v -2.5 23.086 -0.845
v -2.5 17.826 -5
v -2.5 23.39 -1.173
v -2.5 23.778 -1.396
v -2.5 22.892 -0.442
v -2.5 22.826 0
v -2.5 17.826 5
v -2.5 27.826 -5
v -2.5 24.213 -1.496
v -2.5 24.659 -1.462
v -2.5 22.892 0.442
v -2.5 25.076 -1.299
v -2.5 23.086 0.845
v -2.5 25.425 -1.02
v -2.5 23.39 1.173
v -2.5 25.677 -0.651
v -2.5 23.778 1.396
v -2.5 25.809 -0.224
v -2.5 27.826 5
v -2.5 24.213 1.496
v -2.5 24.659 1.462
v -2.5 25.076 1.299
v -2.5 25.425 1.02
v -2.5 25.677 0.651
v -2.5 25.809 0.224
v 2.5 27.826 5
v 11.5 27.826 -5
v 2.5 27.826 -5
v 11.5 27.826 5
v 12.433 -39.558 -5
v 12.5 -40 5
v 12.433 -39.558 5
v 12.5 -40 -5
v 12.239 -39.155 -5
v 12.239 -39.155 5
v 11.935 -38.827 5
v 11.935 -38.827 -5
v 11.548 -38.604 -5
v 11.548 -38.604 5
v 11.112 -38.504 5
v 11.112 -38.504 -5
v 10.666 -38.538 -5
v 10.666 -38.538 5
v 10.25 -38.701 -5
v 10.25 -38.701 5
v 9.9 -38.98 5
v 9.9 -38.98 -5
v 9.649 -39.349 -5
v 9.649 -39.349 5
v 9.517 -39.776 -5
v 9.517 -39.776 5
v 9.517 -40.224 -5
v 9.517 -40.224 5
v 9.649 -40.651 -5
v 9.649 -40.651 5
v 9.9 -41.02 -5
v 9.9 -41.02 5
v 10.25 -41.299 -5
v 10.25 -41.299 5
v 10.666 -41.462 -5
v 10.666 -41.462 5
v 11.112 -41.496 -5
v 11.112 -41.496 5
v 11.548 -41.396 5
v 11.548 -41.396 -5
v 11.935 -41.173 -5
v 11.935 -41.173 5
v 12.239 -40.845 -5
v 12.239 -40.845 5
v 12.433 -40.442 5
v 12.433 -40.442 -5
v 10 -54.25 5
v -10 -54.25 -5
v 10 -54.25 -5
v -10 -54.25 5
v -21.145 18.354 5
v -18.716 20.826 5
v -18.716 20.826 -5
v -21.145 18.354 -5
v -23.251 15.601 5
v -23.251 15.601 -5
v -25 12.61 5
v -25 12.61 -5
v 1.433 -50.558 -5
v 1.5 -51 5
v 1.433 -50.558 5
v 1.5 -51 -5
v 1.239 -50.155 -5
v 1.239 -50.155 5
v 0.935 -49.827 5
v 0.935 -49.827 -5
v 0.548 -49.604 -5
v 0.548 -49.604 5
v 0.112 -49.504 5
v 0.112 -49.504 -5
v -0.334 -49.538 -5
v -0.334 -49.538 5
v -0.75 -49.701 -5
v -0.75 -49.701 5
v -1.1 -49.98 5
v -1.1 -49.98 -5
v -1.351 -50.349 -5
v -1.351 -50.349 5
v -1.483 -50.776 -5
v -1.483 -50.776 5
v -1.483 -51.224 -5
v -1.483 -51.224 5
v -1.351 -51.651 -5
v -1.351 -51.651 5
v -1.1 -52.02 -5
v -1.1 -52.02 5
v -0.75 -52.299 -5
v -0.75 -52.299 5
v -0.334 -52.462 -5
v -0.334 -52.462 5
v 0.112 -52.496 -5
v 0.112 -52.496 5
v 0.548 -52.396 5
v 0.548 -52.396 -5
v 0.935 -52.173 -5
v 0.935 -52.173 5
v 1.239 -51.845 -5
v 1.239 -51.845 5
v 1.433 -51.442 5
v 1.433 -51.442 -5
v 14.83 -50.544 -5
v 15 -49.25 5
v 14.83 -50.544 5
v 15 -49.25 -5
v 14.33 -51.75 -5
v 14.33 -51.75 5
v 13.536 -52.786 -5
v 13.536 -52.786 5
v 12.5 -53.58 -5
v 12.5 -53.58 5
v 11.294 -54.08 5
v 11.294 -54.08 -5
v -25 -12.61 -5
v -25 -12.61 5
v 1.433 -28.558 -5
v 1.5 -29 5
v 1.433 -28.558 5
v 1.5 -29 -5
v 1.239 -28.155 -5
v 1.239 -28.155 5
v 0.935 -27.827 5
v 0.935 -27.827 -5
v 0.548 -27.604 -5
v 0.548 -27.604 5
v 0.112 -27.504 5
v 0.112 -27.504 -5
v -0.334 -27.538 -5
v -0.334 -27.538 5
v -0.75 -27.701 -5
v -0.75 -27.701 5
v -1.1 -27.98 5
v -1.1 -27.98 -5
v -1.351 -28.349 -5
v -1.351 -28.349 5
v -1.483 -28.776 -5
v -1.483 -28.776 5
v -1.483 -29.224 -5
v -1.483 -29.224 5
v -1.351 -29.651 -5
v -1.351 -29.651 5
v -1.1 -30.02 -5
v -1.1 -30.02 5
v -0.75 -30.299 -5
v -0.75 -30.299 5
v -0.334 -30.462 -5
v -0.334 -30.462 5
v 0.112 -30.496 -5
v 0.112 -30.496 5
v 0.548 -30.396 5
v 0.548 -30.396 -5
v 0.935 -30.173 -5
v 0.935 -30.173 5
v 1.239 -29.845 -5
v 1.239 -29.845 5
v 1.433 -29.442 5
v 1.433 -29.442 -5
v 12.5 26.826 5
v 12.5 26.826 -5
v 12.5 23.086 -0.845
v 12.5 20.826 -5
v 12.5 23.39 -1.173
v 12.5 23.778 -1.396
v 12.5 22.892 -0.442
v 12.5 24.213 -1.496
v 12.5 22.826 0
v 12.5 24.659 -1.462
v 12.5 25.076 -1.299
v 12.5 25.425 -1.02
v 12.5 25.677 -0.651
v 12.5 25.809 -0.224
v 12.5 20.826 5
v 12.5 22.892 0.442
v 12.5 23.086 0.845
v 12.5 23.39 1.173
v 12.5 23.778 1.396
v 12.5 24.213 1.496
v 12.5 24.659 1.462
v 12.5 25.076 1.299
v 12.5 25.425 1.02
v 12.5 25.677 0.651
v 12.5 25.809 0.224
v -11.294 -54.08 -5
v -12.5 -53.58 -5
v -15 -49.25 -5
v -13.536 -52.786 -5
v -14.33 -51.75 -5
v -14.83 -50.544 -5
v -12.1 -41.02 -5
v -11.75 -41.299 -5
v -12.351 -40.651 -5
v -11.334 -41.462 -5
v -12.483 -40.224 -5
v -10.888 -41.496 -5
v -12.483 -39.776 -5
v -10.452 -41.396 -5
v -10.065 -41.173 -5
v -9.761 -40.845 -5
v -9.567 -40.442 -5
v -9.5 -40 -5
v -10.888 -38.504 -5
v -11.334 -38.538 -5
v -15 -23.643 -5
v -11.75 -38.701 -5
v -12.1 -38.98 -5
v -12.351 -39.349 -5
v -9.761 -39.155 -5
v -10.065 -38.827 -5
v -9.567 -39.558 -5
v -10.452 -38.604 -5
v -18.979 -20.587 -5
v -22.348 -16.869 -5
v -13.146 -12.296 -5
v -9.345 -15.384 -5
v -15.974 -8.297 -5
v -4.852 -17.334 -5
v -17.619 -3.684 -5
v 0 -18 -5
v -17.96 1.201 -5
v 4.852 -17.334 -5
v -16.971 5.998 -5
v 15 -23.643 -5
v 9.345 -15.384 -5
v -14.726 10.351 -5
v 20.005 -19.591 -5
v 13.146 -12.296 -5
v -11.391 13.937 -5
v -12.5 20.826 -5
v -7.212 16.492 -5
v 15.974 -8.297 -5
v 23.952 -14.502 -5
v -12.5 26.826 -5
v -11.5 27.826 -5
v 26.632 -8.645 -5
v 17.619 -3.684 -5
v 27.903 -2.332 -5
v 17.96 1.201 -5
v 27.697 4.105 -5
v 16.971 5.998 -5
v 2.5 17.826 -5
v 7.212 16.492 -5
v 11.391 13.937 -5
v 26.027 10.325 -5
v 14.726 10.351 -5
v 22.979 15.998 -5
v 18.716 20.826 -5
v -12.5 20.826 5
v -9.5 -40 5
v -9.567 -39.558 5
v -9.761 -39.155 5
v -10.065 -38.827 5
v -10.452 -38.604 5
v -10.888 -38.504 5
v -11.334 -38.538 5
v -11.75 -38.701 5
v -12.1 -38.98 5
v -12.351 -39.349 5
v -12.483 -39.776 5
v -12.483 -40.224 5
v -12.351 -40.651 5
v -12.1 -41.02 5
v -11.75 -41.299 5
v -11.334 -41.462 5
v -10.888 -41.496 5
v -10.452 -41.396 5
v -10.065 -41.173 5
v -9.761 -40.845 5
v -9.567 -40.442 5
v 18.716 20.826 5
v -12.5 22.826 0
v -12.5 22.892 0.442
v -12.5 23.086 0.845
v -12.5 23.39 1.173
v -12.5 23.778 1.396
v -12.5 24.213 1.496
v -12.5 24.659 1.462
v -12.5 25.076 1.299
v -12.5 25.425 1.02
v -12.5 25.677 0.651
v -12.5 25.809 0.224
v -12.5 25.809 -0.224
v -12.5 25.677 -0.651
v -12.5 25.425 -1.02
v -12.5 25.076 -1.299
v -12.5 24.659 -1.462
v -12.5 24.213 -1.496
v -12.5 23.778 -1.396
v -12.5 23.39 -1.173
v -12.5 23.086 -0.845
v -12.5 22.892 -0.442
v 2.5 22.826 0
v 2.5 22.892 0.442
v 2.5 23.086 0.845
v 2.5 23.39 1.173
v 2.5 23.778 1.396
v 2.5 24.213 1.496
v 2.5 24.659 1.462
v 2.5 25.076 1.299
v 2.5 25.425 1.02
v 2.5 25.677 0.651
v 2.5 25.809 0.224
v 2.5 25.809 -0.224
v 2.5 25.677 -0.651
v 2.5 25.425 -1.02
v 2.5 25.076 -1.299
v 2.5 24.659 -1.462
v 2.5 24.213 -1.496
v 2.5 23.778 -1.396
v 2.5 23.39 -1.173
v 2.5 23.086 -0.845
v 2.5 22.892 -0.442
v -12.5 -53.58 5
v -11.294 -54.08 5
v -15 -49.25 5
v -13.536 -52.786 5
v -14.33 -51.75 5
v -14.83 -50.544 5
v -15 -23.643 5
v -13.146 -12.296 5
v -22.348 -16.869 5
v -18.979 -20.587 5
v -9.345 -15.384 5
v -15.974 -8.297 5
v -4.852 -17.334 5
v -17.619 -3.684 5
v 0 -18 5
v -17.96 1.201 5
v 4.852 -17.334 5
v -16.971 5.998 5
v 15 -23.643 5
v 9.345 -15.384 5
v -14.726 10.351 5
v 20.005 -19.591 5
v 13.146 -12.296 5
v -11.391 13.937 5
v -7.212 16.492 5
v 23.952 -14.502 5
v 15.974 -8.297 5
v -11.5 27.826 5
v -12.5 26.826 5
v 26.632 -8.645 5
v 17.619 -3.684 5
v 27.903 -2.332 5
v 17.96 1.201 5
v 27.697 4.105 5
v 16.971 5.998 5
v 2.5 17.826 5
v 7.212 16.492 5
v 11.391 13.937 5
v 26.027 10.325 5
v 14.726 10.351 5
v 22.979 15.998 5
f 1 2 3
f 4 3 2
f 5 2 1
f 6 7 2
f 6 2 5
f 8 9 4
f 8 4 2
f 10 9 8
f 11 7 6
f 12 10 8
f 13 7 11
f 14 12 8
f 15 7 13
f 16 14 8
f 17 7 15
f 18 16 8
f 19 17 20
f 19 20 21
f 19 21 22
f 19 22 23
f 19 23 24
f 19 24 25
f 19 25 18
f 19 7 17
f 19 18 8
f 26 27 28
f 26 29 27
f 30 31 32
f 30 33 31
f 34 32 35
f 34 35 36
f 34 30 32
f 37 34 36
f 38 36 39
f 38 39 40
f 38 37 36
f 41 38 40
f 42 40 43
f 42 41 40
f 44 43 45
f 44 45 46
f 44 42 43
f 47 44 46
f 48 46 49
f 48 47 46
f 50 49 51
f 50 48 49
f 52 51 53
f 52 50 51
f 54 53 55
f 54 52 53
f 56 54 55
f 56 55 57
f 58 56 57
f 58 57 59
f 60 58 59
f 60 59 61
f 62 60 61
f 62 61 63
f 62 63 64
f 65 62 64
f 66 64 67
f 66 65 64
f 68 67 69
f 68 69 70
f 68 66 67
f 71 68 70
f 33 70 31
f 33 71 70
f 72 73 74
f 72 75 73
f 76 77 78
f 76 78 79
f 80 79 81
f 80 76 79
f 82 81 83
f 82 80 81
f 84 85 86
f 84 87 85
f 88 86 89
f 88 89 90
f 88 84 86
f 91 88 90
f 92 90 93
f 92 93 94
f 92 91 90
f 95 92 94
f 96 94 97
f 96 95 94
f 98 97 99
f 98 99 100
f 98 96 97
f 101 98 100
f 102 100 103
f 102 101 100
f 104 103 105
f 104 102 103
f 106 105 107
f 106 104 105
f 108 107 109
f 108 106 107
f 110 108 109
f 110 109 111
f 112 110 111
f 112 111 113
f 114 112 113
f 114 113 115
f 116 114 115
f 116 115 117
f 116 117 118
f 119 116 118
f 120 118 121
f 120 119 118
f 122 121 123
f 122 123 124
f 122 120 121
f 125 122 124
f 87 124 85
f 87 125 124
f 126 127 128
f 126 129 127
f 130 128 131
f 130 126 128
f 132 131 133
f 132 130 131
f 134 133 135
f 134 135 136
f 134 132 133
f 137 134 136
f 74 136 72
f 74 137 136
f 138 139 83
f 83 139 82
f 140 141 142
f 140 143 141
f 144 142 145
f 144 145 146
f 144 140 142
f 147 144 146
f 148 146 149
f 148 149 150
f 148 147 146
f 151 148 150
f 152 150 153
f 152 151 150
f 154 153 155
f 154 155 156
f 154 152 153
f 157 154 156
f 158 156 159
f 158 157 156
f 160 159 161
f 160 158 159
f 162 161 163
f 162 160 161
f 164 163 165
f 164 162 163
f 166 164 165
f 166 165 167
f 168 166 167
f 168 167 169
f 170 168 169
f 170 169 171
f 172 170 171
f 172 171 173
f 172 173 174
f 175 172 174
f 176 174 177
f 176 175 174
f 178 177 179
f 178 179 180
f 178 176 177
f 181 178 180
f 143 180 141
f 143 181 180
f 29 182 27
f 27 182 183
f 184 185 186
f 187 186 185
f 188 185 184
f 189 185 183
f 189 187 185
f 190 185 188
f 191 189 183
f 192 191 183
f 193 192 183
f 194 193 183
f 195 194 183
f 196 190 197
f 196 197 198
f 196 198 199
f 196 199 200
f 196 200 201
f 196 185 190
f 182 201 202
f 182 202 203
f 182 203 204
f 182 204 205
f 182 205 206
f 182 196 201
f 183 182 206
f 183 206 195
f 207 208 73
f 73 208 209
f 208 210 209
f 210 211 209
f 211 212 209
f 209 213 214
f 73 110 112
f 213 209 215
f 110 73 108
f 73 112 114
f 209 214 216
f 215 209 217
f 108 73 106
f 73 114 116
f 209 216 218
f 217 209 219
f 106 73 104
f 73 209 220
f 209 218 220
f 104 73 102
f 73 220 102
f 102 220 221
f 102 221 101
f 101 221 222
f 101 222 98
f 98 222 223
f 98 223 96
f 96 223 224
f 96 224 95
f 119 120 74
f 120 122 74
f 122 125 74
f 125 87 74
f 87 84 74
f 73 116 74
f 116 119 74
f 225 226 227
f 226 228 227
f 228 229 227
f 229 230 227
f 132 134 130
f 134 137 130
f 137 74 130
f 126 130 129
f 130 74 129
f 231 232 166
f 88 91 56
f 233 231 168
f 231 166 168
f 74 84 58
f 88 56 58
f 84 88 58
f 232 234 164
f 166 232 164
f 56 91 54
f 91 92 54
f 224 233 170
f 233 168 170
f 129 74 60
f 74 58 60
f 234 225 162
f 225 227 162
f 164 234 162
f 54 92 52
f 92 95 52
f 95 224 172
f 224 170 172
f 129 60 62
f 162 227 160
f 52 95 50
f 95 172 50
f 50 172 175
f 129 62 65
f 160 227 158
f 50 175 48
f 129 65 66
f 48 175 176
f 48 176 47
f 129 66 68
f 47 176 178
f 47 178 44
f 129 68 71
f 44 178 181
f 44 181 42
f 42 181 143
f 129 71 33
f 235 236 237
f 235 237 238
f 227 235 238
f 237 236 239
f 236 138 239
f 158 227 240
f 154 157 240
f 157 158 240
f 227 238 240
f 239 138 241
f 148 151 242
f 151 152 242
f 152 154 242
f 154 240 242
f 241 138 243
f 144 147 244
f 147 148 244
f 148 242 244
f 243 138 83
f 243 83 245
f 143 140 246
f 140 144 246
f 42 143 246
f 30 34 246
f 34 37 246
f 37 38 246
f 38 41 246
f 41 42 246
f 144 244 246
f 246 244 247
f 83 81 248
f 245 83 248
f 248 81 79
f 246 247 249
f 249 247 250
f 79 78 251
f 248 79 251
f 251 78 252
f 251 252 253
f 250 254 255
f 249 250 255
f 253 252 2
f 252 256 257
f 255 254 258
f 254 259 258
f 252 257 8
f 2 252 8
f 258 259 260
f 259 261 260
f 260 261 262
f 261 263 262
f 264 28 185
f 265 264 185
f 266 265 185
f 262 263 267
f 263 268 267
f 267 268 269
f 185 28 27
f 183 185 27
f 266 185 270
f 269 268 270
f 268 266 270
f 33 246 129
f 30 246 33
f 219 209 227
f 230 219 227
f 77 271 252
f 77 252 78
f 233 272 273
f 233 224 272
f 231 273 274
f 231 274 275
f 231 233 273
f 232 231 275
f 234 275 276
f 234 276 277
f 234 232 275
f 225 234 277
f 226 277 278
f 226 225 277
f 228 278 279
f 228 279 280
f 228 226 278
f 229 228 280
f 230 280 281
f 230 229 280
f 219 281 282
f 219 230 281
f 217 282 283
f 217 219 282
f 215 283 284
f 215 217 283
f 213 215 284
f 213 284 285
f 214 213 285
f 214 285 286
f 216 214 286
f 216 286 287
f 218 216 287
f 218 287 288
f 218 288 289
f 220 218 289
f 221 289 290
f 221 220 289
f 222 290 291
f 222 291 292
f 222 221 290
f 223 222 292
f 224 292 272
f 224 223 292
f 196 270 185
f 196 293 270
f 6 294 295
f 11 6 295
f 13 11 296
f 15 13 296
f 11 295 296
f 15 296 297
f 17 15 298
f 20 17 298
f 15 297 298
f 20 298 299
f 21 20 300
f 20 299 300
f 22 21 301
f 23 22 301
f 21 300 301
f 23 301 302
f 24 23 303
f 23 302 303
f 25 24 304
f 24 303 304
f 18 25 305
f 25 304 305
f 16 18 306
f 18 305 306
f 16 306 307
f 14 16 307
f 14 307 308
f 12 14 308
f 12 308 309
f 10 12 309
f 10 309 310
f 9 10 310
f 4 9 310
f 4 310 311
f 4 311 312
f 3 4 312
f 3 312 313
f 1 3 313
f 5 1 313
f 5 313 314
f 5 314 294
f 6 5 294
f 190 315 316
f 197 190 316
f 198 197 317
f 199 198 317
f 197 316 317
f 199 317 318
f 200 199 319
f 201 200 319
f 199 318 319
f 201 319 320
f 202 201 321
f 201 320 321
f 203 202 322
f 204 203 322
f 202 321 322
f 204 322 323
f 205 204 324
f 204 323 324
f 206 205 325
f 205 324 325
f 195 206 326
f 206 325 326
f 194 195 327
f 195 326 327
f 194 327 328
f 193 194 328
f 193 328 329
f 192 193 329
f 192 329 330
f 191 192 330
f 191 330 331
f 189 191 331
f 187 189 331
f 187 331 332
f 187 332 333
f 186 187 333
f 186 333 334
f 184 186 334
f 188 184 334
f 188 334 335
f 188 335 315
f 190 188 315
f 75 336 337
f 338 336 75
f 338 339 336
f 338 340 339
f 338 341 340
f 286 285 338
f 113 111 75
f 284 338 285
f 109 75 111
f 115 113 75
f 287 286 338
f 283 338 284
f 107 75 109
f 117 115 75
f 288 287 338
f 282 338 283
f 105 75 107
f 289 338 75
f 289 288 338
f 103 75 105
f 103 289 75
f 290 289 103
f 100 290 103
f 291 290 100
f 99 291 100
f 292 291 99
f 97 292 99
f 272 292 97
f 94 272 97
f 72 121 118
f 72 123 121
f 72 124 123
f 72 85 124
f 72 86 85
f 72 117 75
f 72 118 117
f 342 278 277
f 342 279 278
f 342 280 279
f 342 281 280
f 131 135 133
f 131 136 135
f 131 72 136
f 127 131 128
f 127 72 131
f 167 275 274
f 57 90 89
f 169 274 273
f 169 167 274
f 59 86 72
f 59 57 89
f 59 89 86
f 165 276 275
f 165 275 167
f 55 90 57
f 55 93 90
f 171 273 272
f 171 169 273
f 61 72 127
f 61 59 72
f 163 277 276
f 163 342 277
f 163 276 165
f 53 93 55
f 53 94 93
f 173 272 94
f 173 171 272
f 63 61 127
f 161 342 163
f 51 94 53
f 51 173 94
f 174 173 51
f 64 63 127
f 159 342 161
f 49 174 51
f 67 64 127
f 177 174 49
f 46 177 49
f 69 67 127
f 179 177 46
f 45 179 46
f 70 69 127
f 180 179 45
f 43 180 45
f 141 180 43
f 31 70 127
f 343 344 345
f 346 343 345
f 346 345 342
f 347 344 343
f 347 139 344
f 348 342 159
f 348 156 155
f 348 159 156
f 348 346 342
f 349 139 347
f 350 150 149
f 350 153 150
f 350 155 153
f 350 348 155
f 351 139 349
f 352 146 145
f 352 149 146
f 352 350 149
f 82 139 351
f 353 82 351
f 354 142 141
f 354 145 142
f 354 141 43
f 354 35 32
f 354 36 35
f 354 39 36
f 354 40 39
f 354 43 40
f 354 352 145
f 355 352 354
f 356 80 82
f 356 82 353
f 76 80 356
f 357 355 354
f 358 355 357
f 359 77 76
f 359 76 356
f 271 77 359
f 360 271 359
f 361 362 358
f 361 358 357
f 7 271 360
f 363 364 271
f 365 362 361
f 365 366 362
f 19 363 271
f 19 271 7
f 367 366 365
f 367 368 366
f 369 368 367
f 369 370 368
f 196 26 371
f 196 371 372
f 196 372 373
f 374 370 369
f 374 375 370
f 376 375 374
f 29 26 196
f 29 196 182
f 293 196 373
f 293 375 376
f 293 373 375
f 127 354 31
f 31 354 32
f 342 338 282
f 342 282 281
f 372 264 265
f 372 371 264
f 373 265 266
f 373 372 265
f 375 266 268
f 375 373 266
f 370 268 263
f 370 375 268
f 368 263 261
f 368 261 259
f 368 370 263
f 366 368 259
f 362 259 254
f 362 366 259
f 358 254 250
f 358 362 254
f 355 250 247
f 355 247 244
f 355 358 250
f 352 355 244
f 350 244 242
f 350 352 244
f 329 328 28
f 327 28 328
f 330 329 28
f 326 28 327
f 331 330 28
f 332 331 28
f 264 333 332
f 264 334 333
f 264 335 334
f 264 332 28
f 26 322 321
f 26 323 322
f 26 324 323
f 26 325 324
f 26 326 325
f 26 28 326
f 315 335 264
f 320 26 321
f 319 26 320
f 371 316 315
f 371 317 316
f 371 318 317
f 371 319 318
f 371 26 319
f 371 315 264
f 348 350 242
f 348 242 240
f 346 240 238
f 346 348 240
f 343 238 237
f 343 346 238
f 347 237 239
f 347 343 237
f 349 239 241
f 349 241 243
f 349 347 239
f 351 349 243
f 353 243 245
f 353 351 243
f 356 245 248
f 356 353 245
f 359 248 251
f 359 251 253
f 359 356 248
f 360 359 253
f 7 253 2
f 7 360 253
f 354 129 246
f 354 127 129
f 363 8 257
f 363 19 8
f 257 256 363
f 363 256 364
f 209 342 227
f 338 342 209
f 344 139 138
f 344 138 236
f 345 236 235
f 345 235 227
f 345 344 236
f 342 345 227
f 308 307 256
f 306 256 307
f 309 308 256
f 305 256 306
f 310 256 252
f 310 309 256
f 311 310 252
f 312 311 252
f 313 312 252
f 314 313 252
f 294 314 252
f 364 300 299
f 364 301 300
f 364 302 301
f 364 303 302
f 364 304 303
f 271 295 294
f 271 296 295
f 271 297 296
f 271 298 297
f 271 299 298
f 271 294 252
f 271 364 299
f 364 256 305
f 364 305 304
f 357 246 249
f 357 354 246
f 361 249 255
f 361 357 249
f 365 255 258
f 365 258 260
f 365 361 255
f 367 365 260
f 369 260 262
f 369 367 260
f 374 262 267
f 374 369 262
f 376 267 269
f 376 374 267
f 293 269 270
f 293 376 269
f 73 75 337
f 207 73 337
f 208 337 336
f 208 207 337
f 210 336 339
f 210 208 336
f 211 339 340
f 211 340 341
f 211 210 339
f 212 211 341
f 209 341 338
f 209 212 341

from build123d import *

# Parameters (mm, degrees)
F0_R     = 1.5
F1_DEPTH = 5
F2_R     = 1.5
F3_DEPTH = 40.501
F4_SIZE  = 1
F5_R     = 5
F7_W     = 44.468724
F7_H     = 10
F8_DEPTH = 3


with BuildPart() as f1:
    # F0 (on Top) → F1 (new body, symmetric)
    with BuildSketch(Plane.XY):
        with BuildLine():
            ThreePointArc((2.5, 17.825543), (17.956333, -1.25304), (0, -18))
            ThreePointArc((0, -18), (-17.956333, -1.25304), (-2.5, 17.825543))
            Line((-2.5, 17.825543), (-2.5, 27.825543))
            Line((-2.5, 27.825543), (-12.5, 27.825543))
            Line((-12.5, 27.825543), (-12.5, 20.825543))
            Line((-12.5, 20.825543), (-18.716216, 20.825543))
            ThreePointArc((-18.716216, 20.825543), (-27.902736, -2.331809), (-15, -23.643181))
            Line((-15, -23.643181), (-15, -54.25))
            Line((-15, -54.25), (0, -54.25))
            Line((0, -54.25), (15, -54.25))
            Line((15, -54.25), (15, -23.643181))
            ThreePointArc((15, -23.643181), (27.902736, -2.331809), (18.716216, 20.825543))
            Line((18.716216, 20.825543), (12.5, 20.825543))
            Line((12.5, 20.825543), (12.5, 27.825543))
            Line((12.5, 27.825543), (2.5, 27.825543))
            Line((2.5, 27.825543), (2.5, 17.825543))
        make_face()
        with Locations((-11, -40)):
            Circle(F0_R, mode=Mode.SUBTRACT)
        with Locations((0, -51)):
            Circle(F0_R, mode=Mode.SUBTRACT)
        with Locations((11, -40)):
            Circle(F0_R, mode=Mode.SUBTRACT)
        with Locations((0, -29)):
            Circle(F0_R, mode=Mode.SUBTRACT)
    extrude(amount=F1_DEPTH, both=True)

    # F2 (on face) → F3 (cut, through all)
    with BuildSketch(Plane(origin=(-12.5, 0, 0), x_dir=(0, -1, 0), z_dir=(-1, 0, 0))):
        with Locations((-24.325543, 0)):
            Circle(F2_R)
    extrude(amount=-F3_DEPTH, mode=Mode.SUBTRACT)

    # F4
    f4_edges = [f1.edges().sort_by_distance(p)[0] for p in [
        (12.5, 27.825543, 0),
        (-12.5, 27.825543, 0),
    ]]
    chamfer(f4_edges, length=F4_SIZE)

    # F5
    f5_edges = [f1.edges().sort_by_distance(p)[0] for p in [
        (-15, -54.25, 0),
        (15, -54.25, 0),
    ]]
    fillet(f5_edges, radius=F5_R)

    # F7 (on plane+point) → F8 (cut)
    with BuildSketch(Plane.YZ.offset(-28)):
        with Locations((-1.408819, 0)):
            Rectangle(F7_W, F7_H)
    extrude(amount=F8_DEPTH, mode=Mode.SUBTRACT)


solid = f1.part
